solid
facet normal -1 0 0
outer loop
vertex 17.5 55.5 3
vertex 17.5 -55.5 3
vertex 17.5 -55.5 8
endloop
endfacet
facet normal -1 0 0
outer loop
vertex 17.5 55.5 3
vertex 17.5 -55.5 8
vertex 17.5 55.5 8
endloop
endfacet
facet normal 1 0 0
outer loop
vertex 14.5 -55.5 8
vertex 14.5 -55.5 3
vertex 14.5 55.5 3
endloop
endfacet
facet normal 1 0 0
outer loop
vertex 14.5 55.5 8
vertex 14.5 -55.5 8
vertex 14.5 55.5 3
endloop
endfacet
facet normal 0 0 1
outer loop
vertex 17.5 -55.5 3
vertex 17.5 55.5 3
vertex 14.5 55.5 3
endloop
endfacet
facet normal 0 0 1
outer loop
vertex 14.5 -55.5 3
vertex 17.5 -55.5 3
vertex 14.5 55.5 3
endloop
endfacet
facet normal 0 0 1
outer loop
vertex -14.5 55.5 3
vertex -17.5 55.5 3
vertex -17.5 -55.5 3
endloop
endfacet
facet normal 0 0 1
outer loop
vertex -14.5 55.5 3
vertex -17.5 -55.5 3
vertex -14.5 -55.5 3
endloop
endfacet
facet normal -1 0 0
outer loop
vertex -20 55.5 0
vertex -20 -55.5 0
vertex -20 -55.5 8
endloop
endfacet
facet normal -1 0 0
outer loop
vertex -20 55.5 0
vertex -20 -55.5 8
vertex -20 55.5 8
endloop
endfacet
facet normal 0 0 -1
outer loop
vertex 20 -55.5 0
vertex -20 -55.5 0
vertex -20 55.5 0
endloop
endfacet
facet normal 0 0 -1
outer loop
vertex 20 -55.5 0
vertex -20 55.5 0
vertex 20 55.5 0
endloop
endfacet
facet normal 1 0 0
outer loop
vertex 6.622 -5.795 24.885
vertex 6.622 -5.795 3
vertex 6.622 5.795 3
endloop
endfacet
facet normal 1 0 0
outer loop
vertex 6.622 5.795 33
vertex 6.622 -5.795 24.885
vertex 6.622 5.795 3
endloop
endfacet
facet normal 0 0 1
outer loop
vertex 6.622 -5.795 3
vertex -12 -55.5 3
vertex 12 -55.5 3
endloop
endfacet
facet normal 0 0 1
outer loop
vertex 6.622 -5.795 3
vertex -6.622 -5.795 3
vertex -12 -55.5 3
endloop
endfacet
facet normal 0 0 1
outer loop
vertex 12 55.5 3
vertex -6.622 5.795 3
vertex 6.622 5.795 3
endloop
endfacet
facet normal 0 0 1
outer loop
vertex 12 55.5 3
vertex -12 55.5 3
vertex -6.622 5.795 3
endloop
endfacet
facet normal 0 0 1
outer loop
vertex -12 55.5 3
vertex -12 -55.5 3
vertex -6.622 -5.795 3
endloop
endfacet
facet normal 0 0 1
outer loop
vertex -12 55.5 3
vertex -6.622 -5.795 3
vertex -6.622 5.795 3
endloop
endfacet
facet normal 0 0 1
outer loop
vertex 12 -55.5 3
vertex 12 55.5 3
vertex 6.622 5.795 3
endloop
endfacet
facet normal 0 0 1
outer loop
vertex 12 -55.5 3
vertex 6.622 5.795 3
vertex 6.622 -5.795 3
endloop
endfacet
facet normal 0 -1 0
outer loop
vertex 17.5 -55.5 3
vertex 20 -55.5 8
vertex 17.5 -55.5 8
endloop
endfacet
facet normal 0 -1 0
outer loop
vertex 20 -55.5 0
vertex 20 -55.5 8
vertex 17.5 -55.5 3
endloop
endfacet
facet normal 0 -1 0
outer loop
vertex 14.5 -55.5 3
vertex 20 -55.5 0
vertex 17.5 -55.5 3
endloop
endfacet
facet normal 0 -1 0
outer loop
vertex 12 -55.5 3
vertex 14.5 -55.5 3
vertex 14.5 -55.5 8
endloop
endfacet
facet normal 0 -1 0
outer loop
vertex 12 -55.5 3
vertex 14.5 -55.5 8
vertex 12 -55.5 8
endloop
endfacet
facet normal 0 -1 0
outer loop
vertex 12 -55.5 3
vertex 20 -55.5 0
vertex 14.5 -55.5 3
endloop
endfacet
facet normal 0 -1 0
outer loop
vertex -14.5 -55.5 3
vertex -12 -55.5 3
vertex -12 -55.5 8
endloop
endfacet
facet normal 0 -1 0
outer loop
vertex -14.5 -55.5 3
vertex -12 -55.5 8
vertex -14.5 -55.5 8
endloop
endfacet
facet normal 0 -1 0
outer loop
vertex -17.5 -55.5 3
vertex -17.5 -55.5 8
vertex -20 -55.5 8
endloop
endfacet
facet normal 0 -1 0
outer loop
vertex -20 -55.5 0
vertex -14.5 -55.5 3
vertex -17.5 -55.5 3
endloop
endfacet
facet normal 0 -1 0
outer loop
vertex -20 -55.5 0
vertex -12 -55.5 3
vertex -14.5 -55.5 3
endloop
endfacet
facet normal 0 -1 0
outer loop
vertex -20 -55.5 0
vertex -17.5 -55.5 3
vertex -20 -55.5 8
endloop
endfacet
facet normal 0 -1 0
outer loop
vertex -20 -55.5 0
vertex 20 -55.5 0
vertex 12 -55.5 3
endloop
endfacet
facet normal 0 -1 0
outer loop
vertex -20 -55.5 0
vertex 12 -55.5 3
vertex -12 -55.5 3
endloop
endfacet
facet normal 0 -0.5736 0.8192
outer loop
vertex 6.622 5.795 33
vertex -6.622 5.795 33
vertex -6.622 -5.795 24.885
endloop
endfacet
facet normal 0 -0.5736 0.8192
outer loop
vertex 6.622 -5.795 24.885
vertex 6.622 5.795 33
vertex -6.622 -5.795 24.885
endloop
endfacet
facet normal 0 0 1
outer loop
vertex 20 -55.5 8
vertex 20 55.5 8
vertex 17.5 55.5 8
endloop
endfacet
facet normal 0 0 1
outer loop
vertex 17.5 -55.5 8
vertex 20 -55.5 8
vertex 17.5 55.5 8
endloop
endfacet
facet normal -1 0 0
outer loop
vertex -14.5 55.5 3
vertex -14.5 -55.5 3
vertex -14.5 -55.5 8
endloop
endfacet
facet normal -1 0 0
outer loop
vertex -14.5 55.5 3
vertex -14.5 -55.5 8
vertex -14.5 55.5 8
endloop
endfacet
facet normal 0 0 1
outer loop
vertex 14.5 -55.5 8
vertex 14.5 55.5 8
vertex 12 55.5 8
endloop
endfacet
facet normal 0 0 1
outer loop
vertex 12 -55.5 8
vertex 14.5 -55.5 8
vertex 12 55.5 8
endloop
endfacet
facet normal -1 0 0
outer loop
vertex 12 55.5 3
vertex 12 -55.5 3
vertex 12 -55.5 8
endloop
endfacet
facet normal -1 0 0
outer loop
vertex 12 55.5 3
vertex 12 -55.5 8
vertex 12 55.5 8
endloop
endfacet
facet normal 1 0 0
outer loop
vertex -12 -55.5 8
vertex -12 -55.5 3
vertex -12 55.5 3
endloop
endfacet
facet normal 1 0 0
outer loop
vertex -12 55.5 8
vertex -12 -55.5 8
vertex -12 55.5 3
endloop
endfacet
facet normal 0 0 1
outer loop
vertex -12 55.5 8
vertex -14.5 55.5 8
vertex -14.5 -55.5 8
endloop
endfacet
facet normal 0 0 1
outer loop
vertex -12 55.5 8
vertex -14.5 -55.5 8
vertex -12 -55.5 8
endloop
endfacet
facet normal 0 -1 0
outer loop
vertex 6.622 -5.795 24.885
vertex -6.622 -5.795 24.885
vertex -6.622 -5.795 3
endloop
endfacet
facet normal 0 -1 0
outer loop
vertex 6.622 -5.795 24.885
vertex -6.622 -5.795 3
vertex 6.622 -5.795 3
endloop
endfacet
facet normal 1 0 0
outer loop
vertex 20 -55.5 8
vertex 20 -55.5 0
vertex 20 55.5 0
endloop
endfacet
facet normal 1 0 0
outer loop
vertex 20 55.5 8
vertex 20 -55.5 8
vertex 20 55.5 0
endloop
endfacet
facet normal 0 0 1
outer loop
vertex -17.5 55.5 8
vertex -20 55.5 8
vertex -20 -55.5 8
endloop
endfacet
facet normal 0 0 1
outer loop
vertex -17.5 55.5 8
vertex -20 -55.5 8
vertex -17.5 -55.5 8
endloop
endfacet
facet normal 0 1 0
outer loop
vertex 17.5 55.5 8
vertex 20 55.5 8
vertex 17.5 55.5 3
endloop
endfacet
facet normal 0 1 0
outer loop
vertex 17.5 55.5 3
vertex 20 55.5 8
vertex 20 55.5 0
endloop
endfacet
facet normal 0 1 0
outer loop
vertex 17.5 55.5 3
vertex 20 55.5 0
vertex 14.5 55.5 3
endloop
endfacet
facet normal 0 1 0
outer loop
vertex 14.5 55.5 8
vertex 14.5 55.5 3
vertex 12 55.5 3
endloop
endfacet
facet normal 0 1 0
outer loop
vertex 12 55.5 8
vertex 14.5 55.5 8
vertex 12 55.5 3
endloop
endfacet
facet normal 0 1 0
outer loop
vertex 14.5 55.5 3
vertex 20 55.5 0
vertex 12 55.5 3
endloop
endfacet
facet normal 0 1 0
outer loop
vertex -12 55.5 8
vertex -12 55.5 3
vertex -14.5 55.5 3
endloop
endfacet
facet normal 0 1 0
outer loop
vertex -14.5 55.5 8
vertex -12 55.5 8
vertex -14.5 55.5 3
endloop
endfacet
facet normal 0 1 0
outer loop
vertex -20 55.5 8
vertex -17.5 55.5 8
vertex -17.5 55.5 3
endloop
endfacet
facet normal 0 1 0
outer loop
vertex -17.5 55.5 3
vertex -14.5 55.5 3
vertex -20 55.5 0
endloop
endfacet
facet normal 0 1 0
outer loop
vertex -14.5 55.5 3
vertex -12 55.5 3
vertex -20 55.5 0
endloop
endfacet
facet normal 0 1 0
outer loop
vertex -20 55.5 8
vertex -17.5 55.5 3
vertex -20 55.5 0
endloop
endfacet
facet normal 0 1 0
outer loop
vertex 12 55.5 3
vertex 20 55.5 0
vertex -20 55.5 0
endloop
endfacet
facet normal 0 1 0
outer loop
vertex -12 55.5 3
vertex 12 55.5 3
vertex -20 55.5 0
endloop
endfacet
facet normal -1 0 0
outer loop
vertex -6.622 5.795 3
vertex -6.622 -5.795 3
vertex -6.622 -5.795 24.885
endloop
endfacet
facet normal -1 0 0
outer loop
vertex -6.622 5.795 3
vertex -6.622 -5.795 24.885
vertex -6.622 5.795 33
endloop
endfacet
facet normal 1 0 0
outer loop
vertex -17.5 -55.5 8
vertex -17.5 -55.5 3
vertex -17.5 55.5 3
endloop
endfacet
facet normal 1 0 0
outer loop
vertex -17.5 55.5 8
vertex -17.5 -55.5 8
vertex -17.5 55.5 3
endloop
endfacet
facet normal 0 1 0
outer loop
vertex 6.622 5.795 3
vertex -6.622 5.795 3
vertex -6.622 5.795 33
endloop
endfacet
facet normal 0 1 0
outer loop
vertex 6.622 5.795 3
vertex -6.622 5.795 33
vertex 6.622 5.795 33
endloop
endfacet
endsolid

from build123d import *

# Parameters (mm, degrees)
F0_W     = 40
F0_H     = 111
F1_DEPTH = 3
F2_W     = 2.5
F2_H     = 111
F3_DEPTH = 5
F5_W     = 13.24492
F5_H     = 11.589288
F6_DEPTH = 30
F8_DEPTH = 25.4


with BuildPart() as f1:
    # F0 (on Top) → F1 (new body)
    with BuildSketch(Plane.XY):
        Rectangle(F0_W, F0_H)
    extrude(amount=F1_DEPTH)

    # F2 (on face) → F3 (join)
    with BuildSketch(Plane.XY.offset(3)):
        with Locations((-13.25, 0)):
            Rectangle(F2_W, F2_H)
        with Locations((-18.75, 0)):
            Rectangle(F2_W, F2_H)
    extrude(amount=F3_DEPTH)

    # F4: F1 across plane


with BuildPart() as f1_1:
    add(f1.part)
    add(f1.part.mirror(Plane.YZ))

    # F5 (on face) → F6 (join)
    with BuildSketch(Plane.XY.offset(3)):
        Rectangle(F5_W, F5_H)
    extrude(amount=F6_DEPTH)

    # F7 (on face) → F8 (cut)
    with BuildSketch(Plane(origin=(-6.62246, 0, 0), x_dir=(0, -1, 0), z_dir=(-1, 0, 0))):
        Polygon((5.794644, 33), (-5.794644, 33), (5.794644, 24.885093), align=None)
    extrude(amount=-F8_DEPTH, mode=Mode.SUBTRACT)


solid = f1_1.part
